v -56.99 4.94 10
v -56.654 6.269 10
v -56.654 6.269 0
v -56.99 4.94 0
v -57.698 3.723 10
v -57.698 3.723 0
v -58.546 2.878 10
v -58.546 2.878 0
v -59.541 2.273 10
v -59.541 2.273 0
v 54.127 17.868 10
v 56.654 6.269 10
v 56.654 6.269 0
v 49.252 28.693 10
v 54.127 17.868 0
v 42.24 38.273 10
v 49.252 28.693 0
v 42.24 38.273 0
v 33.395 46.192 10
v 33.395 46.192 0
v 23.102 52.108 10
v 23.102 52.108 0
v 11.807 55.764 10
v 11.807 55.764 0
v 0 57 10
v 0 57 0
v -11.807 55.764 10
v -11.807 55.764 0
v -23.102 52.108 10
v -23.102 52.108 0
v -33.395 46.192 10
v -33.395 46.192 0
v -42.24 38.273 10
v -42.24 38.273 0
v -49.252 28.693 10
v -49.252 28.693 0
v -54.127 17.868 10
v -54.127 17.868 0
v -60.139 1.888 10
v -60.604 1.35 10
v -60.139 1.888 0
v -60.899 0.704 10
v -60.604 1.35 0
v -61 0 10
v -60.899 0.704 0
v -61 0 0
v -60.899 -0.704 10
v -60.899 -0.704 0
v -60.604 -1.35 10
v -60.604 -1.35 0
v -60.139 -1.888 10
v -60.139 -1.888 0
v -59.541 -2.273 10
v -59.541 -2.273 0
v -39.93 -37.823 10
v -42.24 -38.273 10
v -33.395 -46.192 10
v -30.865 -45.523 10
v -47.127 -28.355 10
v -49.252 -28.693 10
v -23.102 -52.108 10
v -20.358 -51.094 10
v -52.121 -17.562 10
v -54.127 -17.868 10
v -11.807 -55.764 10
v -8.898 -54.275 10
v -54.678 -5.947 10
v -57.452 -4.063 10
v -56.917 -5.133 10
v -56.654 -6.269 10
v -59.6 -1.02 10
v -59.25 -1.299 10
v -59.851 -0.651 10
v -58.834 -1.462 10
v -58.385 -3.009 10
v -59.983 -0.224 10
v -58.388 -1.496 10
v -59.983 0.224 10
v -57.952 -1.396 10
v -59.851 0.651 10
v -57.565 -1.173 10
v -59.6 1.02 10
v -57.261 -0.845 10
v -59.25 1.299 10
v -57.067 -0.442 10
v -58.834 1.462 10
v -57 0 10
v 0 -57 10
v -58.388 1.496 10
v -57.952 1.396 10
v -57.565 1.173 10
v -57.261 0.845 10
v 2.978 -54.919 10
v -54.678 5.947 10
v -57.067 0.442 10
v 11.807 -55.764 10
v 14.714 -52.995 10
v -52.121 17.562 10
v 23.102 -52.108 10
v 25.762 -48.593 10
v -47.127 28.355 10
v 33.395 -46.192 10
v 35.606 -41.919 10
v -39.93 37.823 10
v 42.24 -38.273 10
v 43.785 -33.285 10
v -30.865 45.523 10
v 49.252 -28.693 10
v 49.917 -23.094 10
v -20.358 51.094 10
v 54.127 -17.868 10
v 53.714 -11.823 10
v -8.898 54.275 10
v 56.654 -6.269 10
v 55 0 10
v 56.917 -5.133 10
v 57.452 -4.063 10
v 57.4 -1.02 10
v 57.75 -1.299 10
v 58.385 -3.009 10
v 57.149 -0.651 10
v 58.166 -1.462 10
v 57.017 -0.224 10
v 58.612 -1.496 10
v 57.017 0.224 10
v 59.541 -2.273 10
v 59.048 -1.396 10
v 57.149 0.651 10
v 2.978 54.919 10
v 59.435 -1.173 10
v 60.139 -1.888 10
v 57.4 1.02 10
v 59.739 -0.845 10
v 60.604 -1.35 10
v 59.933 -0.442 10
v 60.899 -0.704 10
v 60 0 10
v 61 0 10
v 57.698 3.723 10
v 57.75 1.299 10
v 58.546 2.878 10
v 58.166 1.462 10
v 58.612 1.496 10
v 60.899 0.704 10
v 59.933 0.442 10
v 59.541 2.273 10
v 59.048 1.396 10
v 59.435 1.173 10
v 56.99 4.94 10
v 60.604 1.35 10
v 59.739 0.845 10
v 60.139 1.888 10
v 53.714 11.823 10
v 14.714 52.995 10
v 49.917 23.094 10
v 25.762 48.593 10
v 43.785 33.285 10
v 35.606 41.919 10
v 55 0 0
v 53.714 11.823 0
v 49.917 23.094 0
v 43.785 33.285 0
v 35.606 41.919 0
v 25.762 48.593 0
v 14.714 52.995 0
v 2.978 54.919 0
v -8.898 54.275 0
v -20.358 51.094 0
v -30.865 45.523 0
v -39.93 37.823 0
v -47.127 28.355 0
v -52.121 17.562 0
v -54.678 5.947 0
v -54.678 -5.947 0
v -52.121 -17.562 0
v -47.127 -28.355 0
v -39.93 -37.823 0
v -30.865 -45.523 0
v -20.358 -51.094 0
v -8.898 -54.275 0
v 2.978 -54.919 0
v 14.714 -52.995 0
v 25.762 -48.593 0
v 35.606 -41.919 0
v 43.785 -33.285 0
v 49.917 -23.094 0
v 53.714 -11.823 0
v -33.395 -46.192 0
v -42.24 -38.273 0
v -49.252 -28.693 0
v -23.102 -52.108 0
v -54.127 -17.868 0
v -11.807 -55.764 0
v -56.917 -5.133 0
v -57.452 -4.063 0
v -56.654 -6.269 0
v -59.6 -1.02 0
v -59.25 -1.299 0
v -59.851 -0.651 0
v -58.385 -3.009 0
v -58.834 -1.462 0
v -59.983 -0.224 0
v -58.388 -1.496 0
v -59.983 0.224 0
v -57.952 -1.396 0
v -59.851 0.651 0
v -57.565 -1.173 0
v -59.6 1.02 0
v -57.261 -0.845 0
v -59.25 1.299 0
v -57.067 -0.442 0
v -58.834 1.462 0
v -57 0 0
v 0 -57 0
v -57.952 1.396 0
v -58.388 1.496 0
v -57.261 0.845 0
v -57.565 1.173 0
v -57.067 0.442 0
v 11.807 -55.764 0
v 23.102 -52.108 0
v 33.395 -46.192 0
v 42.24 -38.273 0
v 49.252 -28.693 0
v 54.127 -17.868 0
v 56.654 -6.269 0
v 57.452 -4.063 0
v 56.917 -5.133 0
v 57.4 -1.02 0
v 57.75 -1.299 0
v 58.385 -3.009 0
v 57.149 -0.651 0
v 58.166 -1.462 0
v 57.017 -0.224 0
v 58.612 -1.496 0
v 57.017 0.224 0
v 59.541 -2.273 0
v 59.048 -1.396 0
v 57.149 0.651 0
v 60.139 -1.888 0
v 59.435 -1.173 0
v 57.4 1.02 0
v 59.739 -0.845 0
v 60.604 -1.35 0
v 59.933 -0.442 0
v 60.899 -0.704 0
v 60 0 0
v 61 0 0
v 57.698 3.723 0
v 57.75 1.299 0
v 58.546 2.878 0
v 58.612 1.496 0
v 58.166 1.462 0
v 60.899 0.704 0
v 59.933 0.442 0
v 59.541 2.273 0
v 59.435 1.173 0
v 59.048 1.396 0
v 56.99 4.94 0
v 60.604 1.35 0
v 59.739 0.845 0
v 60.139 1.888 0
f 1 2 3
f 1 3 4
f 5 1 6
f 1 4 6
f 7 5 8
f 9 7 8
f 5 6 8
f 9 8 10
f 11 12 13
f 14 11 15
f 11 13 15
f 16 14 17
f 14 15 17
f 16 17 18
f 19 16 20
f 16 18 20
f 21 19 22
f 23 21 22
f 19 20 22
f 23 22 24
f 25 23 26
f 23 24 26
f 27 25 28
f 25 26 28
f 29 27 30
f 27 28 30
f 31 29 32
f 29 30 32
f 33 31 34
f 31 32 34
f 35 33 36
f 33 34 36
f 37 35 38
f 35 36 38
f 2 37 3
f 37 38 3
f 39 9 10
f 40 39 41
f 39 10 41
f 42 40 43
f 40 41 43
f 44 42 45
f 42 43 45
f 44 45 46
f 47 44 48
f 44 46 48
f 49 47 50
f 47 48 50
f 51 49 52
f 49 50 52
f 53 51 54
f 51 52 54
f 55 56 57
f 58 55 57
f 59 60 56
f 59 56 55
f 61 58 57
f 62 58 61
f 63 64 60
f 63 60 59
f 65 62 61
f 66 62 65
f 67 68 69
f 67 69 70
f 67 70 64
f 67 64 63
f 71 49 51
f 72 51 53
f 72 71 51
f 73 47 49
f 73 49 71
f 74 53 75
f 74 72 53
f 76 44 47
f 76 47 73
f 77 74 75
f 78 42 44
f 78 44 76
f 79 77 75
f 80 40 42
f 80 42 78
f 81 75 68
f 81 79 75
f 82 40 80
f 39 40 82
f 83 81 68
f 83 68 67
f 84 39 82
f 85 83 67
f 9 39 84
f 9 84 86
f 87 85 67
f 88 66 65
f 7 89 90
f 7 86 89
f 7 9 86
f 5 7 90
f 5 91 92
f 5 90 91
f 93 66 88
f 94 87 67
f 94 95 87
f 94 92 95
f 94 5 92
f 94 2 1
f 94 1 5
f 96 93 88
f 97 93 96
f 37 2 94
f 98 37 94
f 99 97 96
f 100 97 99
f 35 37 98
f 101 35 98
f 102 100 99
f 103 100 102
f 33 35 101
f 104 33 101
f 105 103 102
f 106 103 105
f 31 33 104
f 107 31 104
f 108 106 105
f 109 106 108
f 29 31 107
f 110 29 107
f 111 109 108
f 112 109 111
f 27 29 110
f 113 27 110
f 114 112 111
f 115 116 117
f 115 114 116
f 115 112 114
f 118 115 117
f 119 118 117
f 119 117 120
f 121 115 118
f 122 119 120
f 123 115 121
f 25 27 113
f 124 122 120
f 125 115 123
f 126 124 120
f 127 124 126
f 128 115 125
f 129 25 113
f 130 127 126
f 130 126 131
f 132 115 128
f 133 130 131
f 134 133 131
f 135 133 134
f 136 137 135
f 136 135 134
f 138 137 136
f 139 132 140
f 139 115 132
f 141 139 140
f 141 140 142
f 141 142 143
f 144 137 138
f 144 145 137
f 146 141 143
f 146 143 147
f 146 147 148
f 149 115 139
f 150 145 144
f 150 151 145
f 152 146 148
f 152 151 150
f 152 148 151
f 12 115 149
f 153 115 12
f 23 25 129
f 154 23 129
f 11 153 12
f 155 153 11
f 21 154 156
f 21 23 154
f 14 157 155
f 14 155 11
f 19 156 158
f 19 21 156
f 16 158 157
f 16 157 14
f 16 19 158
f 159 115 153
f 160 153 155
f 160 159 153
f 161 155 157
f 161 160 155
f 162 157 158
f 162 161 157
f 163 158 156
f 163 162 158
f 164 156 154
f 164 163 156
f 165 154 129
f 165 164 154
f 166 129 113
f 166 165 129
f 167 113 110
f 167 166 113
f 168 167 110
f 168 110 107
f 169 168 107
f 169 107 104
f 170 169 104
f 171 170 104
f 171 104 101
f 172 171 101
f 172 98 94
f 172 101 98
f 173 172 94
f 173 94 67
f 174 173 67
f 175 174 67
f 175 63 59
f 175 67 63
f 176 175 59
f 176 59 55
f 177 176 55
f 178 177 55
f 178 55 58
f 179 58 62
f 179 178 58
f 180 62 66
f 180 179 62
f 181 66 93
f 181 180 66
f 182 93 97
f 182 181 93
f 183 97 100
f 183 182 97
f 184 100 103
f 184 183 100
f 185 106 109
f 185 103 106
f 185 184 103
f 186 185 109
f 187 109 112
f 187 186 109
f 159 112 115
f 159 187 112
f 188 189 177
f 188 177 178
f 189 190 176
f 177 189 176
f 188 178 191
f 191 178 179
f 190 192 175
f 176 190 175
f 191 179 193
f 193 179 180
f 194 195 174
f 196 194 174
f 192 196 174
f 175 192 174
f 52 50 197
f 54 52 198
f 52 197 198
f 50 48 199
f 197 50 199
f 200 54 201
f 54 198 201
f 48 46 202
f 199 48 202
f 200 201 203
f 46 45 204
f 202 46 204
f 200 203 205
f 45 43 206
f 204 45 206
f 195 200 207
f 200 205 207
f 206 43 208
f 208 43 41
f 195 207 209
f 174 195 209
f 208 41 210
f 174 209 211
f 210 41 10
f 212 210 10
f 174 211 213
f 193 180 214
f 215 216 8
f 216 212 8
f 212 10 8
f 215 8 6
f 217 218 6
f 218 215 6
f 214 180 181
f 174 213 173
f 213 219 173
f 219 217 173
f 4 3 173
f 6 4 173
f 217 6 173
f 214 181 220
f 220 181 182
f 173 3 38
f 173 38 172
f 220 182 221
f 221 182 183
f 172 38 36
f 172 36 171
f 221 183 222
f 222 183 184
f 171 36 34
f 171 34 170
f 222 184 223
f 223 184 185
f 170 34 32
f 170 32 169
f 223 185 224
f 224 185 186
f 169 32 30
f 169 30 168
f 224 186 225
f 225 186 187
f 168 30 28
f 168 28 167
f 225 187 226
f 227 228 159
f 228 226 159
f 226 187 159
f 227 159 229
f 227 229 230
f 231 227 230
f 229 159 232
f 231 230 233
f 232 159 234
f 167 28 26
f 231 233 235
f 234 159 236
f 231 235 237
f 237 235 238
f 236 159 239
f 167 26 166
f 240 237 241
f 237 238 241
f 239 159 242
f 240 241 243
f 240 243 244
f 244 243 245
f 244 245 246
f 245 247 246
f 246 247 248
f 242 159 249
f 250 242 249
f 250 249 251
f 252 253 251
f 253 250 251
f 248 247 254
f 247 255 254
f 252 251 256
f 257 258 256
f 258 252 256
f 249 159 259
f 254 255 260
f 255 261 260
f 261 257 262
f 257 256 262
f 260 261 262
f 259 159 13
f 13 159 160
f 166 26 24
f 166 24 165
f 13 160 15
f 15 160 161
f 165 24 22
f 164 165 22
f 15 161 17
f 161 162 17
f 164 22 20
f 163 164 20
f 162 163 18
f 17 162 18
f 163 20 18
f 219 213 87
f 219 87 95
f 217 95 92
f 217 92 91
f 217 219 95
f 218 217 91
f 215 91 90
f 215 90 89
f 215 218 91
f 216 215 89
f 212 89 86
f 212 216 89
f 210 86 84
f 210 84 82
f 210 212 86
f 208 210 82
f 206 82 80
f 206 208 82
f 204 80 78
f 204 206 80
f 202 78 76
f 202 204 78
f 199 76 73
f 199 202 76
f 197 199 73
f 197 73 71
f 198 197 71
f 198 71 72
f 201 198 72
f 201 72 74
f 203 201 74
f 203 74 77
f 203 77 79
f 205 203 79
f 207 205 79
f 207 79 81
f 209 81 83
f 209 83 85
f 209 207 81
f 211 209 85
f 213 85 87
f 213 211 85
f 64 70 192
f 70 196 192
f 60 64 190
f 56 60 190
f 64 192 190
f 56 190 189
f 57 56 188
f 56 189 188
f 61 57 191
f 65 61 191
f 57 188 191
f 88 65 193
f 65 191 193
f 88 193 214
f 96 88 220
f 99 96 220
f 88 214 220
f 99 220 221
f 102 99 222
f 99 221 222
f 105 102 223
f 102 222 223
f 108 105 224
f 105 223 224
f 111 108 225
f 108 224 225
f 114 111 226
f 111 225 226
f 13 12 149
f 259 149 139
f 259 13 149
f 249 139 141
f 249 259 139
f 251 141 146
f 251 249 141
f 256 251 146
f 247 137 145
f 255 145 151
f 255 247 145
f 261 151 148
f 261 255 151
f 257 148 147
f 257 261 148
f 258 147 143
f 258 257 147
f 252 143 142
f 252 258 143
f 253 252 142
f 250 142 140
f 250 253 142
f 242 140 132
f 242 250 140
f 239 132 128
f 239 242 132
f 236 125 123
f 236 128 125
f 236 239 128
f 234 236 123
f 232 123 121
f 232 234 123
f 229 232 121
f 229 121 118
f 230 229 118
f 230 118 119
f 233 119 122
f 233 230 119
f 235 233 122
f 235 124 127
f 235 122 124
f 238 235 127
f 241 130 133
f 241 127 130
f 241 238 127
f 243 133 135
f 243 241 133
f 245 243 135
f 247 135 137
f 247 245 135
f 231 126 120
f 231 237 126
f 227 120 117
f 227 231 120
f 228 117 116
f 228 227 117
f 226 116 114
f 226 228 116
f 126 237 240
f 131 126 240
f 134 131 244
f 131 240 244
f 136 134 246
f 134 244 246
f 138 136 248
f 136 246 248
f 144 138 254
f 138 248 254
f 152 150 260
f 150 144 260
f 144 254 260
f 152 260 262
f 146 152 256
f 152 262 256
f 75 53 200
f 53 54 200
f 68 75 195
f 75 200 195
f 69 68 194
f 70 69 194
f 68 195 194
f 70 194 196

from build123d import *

# Parameters (mm, degrees)
F0_R     = 57
F1_DEPTH = 10
F2_R     = 55
F3_DEPTH = 25
F4_R     = 2.5
F4_R_2   = 1.5
F5_DEPTH = 10
F6_R     = 5
F7_R     = 5


with BuildPart() as f1:
    # F0 (on Top) → F1 (new body)
    with BuildSketch(Plane.XY):
        Circle(F0_R)
    extrude(amount=F1_DEPTH)

    # F2 (on Top) → F3 (cut)
    with BuildSketch(Plane.XY):
        Circle(F2_R)
    extrude(amount=F3_DEPTH, mode=Mode.SUBTRACT)

    # F4 (on Top) → F5 (join)
    with BuildSketch(Plane.XY):
        with Locations((58.5, 0)):
            Circle(F4_R)
        with Locations((58.5, 0)):
            Circle(F4_R_2, mode=Mode.SUBTRACT)
        with Locations((-58.5, 0)):
            Circle(F4_R)
        with Locations((-58.5, 0)):
            Circle(F4_R_2, mode=Mode.SUBTRACT)
    extrude(amount=F5_DEPTH)

    # F6
    f6_edges = [f1.edges().sort_by_distance(p)[0] for p in [
        (-56.965812, -1.973896, 5),
        (-56.965812, 1.973896, 5),
    ]]
    fillet(f6_edges, radius=F6_R)

    # F7
    f7_edges = [f1.edges().sort_by_distance(p)[0] for p in [
        (56.965812, -1.973896, 5),
        (56.965812, 1.973896, 5),
    ]]
    fillet(f7_edges, radius=F7_R)


solid = f1.part
